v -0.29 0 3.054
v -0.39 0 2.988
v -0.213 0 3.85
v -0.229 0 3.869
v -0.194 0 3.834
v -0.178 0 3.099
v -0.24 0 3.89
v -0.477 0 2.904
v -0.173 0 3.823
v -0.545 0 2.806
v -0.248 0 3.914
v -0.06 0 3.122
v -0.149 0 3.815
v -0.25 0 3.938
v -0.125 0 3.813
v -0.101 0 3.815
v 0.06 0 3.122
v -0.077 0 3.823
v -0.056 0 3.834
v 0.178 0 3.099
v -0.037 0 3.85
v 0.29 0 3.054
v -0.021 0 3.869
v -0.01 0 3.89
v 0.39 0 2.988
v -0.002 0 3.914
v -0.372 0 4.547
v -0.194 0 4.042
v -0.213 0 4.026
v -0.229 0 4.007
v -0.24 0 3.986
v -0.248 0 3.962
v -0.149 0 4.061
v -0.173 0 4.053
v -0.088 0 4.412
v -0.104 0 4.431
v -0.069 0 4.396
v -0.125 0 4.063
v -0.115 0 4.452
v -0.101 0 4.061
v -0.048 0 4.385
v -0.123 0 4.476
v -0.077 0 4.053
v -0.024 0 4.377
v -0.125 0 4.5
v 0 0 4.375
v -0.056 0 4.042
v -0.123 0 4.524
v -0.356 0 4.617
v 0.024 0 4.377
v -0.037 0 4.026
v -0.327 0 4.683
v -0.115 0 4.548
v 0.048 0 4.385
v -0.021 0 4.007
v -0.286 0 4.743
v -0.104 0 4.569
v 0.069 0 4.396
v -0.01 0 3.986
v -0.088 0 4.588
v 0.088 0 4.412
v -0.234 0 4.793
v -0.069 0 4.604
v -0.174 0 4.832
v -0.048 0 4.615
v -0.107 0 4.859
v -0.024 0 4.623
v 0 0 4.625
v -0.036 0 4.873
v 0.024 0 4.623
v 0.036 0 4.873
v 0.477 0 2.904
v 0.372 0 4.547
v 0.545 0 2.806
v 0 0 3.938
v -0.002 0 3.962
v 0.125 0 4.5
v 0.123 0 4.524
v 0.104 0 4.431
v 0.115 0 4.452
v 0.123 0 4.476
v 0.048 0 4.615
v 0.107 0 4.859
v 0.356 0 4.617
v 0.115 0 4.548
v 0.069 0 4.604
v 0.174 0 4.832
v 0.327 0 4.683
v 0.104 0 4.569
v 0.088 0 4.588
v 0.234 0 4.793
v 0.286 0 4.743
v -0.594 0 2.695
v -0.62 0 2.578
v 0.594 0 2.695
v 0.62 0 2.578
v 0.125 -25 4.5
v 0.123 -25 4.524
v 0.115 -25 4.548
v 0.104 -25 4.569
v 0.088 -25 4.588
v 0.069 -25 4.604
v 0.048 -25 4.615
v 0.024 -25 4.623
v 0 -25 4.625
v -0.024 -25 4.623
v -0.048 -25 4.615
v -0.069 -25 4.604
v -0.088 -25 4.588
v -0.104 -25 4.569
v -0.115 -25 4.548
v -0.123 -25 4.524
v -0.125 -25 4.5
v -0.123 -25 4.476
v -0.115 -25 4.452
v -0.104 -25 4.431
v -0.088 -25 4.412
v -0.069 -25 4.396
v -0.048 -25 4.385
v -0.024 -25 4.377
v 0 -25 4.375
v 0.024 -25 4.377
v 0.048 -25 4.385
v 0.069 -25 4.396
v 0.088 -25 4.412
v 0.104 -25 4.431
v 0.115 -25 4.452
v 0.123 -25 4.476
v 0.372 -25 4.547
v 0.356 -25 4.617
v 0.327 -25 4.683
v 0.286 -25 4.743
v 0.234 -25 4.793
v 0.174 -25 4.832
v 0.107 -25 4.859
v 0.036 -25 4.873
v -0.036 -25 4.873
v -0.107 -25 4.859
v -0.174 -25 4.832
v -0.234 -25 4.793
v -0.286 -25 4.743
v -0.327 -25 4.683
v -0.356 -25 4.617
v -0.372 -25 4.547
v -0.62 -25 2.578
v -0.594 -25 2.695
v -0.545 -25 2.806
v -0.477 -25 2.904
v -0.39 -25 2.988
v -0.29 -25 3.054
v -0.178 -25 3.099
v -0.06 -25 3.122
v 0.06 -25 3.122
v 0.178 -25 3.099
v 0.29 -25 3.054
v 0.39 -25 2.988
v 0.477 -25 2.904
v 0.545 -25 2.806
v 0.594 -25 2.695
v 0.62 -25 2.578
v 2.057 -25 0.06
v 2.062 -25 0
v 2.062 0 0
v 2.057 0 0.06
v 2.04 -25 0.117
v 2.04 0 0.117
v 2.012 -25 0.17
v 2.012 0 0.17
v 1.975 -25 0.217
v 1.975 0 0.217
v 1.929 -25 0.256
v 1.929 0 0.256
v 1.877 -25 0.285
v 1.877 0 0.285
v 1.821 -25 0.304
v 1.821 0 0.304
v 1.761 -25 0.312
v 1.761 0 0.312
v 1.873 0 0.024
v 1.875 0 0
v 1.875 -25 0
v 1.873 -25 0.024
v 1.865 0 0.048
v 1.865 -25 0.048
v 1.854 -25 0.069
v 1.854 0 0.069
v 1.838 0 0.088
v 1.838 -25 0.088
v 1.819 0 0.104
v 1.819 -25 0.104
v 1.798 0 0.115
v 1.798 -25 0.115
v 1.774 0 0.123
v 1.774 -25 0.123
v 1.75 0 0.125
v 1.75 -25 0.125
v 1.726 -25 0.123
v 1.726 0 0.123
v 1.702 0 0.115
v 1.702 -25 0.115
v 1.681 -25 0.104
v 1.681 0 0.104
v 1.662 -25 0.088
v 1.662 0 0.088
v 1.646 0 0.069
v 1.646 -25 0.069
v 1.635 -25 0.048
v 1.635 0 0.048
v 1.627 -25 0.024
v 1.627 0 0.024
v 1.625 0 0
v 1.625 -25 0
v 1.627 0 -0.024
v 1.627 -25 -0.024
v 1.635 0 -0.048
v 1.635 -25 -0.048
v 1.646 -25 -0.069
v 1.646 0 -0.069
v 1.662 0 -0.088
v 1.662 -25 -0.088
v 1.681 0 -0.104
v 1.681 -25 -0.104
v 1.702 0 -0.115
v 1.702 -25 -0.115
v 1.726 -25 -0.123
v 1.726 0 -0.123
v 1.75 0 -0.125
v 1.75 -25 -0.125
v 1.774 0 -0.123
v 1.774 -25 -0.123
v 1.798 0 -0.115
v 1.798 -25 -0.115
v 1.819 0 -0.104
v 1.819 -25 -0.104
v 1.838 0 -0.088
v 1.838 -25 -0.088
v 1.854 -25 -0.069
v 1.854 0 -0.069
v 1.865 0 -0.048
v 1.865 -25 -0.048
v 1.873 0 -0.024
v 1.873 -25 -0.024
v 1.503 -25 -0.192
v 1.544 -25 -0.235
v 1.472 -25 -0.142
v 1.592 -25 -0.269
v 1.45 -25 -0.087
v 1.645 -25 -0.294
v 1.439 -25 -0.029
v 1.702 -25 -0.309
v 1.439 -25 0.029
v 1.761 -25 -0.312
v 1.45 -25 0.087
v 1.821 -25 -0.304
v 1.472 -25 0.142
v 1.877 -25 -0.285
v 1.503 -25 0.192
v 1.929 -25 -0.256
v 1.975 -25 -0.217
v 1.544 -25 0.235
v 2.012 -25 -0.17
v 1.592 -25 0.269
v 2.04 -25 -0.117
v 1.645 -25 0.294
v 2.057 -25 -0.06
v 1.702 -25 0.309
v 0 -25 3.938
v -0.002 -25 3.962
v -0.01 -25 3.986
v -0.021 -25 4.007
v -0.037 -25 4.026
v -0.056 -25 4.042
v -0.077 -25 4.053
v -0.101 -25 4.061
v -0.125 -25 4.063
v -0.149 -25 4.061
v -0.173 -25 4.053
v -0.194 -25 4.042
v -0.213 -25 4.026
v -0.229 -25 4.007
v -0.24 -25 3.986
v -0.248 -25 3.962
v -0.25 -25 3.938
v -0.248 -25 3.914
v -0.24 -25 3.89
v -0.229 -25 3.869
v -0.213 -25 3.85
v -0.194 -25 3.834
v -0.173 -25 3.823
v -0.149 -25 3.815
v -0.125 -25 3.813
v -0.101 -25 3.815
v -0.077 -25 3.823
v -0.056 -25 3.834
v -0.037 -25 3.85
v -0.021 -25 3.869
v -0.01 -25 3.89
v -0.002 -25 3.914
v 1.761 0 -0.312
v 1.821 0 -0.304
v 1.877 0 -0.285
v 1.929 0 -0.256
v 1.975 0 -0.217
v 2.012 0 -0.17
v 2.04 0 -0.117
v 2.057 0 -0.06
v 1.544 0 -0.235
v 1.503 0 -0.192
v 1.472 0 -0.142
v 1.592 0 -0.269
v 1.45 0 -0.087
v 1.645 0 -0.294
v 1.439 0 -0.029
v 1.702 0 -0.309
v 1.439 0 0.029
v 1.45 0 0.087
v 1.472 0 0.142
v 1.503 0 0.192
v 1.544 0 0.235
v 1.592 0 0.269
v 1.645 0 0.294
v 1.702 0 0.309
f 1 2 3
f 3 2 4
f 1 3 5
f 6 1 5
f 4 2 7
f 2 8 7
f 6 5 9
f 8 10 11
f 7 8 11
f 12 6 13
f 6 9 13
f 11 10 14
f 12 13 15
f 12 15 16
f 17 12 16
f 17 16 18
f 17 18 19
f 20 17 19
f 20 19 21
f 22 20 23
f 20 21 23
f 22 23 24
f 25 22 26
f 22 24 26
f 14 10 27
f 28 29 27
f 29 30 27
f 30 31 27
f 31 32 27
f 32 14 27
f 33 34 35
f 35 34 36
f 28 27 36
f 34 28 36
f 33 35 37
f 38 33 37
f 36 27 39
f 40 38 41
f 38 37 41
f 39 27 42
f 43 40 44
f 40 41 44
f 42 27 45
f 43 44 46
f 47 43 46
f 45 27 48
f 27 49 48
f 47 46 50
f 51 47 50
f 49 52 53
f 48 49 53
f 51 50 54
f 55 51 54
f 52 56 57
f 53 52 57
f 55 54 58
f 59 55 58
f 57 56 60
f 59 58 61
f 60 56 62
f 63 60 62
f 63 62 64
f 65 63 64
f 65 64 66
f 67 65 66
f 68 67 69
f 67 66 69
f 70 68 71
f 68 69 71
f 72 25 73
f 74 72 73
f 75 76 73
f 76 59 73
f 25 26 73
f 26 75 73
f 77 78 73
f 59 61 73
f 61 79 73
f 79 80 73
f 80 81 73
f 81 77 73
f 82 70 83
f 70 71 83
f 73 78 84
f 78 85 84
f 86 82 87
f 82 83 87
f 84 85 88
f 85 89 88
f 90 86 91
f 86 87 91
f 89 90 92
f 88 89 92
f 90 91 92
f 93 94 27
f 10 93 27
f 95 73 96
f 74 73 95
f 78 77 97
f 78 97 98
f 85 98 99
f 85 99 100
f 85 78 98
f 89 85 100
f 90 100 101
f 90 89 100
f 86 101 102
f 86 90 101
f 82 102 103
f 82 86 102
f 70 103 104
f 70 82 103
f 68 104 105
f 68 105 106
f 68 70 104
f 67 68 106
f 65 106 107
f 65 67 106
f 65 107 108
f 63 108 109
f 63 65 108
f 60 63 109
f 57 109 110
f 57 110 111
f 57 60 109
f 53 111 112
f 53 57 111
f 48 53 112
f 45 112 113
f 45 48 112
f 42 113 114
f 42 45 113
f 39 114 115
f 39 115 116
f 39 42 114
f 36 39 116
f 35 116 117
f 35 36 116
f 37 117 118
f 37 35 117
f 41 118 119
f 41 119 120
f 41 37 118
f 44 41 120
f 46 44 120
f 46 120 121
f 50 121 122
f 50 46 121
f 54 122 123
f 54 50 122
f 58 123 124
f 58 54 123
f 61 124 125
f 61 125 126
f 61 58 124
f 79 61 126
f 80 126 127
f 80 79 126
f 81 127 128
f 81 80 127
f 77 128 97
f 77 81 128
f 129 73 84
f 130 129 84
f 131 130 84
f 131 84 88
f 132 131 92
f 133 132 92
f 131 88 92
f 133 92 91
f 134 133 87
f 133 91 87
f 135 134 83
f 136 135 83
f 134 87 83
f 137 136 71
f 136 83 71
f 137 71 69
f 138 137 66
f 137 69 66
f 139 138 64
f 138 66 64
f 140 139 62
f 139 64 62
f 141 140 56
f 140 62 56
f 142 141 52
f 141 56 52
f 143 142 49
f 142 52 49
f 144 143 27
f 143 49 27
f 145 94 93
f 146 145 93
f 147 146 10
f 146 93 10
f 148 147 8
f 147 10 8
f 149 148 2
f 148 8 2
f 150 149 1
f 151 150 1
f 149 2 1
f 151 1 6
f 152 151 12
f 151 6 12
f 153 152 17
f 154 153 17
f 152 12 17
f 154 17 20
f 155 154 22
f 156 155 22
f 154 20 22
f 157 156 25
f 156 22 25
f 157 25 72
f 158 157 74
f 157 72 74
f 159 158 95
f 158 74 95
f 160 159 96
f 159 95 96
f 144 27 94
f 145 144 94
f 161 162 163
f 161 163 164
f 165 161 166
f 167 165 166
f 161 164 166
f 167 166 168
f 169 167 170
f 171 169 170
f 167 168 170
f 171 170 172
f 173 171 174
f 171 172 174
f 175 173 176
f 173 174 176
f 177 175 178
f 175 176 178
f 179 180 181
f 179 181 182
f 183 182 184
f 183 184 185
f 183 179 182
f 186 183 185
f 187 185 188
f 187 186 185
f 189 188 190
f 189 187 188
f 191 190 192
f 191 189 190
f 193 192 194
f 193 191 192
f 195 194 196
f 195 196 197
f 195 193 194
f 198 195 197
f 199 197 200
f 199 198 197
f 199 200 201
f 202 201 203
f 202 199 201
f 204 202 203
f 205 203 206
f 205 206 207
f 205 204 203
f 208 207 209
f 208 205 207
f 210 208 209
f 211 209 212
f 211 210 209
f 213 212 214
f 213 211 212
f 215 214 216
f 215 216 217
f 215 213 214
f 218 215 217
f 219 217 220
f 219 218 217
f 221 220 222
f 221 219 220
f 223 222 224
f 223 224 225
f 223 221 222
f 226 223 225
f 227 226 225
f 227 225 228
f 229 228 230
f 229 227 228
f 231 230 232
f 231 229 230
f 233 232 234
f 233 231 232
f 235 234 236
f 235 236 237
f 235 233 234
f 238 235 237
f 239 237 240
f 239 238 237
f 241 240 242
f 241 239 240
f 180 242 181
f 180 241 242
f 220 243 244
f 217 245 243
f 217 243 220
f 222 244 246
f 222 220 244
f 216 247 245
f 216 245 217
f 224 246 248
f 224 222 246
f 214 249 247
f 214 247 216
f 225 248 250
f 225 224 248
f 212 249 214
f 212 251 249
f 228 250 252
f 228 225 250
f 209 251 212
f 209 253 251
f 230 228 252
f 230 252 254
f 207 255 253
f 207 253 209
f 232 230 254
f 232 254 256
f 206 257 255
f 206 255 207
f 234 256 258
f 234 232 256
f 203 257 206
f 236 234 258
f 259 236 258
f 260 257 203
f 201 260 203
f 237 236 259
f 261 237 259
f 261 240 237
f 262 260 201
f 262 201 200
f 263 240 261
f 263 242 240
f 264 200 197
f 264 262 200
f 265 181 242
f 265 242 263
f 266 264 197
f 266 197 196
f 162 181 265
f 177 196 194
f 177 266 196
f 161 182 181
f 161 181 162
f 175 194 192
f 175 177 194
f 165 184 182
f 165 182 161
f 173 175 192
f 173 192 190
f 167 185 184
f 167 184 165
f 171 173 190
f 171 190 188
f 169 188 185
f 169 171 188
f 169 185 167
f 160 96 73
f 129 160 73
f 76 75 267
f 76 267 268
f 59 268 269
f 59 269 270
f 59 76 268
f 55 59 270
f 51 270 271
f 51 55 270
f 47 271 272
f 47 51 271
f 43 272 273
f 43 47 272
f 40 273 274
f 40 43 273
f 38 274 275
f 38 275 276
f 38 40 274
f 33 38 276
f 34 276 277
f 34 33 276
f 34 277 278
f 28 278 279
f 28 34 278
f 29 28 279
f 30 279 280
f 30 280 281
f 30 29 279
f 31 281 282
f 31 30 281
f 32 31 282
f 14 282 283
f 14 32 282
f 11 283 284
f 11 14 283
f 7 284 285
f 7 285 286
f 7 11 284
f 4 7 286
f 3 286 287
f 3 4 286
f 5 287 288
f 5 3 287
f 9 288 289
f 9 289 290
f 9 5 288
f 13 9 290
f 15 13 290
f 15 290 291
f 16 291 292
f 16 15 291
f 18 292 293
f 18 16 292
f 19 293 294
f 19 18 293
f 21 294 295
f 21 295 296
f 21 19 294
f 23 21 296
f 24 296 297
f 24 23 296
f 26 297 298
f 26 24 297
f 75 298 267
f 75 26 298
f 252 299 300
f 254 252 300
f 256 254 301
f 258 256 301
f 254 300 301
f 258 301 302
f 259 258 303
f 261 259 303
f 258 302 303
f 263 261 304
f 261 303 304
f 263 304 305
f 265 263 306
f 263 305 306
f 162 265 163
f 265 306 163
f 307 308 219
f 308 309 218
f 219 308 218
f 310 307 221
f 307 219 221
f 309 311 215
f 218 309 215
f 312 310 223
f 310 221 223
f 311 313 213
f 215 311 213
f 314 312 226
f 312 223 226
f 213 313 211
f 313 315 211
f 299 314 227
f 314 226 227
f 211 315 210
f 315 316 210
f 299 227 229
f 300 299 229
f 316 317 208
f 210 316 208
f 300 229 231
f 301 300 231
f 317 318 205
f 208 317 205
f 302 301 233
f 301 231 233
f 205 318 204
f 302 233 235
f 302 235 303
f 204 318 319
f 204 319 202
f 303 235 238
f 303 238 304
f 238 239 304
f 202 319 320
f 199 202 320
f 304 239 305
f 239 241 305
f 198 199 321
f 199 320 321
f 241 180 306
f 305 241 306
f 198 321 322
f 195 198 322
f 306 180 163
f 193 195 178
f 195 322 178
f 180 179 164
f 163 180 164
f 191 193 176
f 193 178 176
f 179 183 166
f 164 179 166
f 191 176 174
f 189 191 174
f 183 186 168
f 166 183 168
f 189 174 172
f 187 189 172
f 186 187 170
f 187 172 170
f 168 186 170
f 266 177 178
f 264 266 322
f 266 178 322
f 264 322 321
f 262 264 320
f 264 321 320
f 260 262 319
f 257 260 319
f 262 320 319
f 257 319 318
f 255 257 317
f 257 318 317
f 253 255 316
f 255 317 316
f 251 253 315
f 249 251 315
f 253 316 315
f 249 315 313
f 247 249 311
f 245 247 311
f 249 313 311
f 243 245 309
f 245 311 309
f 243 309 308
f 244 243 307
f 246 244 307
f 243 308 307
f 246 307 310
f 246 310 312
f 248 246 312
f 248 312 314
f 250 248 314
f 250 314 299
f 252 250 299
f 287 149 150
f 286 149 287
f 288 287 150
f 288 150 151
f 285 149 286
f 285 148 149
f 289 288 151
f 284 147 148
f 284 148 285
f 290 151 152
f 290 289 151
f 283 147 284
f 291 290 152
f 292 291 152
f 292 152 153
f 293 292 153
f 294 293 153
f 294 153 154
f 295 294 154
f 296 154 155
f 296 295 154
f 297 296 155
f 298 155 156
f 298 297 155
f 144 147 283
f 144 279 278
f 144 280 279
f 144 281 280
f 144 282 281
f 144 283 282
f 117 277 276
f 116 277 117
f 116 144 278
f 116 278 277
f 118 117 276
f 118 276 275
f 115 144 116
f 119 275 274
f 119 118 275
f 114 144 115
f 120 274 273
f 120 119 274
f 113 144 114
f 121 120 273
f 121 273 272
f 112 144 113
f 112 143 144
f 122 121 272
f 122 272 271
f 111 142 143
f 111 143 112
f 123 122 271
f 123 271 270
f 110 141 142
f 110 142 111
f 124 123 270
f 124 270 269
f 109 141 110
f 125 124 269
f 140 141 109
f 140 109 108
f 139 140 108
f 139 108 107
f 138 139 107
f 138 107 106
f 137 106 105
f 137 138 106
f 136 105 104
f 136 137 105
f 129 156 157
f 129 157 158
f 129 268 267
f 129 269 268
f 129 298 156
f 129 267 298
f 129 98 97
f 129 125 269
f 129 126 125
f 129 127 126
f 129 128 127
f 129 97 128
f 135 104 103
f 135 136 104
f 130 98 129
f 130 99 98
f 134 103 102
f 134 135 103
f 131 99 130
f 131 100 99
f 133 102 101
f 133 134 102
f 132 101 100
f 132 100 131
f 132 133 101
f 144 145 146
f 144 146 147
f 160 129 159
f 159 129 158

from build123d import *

# Parameters (mm, degrees)
F0_R     = 0.125
F1_DEPTH = 25


with BuildPart() as f1:
    # F0 (on Front) → F1 (new body)
    with BuildSketch(Plane.XZ):
        with BuildLine():
            ThreePointArc((-0.372059, 4.546875), (-0.023484, 4.125736), (0.375, 4.5))
            ThreePointArc((0.375, 4.5), (0.374264, 4.523484), (0.372059, 4.546875))
            ThreePointArc((0.372059, 4.546875), (0, 4.875), (-0.372059, 4.546875))
        make_face()
        with Locations((0, 4.5)):
            Circle(F0_R, mode=Mode.SUBTRACT)
        with BuildLine():
            ThreePointArc((0.372059, 4.546875), (0.374264, 4.523484), (0.375, 4.5))
            ThreePointArc((0.375, 4.5), (-0.023484, 4.125736), (-0.372059, 4.546875))
            Line((-0.372059, 4.546875), (-0.620098, 2.578125))
            ThreePointArc((-0.620098, 2.578125), (0, 3.125), (0.620098, 2.578125))
            Line((0.620098, 2.578125), (0.372059, 4.546875))
        make_face()
        with Locations((-0.125, 3.938)):
            Circle(F0_R, mode=Mode.SUBTRACT)
        with BuildLine():
            ThreePointArc((1.761161, 0.312301), (1.4375, 0), (1.761161, -0.312301))
            ThreePointArc((1.761161, -0.312301), (1.974882, -0.216989), (2.0625, 0))
            ThreePointArc((2.0625, 0), (1.974882, 0.216989), (1.761161, 0.312301))
        make_face()
        with Locations((1.75, 0)):
            Circle(F0_R, mode=Mode.SUBTRACT)
    extrude(amount=F1_DEPTH)


solid = f1.part
